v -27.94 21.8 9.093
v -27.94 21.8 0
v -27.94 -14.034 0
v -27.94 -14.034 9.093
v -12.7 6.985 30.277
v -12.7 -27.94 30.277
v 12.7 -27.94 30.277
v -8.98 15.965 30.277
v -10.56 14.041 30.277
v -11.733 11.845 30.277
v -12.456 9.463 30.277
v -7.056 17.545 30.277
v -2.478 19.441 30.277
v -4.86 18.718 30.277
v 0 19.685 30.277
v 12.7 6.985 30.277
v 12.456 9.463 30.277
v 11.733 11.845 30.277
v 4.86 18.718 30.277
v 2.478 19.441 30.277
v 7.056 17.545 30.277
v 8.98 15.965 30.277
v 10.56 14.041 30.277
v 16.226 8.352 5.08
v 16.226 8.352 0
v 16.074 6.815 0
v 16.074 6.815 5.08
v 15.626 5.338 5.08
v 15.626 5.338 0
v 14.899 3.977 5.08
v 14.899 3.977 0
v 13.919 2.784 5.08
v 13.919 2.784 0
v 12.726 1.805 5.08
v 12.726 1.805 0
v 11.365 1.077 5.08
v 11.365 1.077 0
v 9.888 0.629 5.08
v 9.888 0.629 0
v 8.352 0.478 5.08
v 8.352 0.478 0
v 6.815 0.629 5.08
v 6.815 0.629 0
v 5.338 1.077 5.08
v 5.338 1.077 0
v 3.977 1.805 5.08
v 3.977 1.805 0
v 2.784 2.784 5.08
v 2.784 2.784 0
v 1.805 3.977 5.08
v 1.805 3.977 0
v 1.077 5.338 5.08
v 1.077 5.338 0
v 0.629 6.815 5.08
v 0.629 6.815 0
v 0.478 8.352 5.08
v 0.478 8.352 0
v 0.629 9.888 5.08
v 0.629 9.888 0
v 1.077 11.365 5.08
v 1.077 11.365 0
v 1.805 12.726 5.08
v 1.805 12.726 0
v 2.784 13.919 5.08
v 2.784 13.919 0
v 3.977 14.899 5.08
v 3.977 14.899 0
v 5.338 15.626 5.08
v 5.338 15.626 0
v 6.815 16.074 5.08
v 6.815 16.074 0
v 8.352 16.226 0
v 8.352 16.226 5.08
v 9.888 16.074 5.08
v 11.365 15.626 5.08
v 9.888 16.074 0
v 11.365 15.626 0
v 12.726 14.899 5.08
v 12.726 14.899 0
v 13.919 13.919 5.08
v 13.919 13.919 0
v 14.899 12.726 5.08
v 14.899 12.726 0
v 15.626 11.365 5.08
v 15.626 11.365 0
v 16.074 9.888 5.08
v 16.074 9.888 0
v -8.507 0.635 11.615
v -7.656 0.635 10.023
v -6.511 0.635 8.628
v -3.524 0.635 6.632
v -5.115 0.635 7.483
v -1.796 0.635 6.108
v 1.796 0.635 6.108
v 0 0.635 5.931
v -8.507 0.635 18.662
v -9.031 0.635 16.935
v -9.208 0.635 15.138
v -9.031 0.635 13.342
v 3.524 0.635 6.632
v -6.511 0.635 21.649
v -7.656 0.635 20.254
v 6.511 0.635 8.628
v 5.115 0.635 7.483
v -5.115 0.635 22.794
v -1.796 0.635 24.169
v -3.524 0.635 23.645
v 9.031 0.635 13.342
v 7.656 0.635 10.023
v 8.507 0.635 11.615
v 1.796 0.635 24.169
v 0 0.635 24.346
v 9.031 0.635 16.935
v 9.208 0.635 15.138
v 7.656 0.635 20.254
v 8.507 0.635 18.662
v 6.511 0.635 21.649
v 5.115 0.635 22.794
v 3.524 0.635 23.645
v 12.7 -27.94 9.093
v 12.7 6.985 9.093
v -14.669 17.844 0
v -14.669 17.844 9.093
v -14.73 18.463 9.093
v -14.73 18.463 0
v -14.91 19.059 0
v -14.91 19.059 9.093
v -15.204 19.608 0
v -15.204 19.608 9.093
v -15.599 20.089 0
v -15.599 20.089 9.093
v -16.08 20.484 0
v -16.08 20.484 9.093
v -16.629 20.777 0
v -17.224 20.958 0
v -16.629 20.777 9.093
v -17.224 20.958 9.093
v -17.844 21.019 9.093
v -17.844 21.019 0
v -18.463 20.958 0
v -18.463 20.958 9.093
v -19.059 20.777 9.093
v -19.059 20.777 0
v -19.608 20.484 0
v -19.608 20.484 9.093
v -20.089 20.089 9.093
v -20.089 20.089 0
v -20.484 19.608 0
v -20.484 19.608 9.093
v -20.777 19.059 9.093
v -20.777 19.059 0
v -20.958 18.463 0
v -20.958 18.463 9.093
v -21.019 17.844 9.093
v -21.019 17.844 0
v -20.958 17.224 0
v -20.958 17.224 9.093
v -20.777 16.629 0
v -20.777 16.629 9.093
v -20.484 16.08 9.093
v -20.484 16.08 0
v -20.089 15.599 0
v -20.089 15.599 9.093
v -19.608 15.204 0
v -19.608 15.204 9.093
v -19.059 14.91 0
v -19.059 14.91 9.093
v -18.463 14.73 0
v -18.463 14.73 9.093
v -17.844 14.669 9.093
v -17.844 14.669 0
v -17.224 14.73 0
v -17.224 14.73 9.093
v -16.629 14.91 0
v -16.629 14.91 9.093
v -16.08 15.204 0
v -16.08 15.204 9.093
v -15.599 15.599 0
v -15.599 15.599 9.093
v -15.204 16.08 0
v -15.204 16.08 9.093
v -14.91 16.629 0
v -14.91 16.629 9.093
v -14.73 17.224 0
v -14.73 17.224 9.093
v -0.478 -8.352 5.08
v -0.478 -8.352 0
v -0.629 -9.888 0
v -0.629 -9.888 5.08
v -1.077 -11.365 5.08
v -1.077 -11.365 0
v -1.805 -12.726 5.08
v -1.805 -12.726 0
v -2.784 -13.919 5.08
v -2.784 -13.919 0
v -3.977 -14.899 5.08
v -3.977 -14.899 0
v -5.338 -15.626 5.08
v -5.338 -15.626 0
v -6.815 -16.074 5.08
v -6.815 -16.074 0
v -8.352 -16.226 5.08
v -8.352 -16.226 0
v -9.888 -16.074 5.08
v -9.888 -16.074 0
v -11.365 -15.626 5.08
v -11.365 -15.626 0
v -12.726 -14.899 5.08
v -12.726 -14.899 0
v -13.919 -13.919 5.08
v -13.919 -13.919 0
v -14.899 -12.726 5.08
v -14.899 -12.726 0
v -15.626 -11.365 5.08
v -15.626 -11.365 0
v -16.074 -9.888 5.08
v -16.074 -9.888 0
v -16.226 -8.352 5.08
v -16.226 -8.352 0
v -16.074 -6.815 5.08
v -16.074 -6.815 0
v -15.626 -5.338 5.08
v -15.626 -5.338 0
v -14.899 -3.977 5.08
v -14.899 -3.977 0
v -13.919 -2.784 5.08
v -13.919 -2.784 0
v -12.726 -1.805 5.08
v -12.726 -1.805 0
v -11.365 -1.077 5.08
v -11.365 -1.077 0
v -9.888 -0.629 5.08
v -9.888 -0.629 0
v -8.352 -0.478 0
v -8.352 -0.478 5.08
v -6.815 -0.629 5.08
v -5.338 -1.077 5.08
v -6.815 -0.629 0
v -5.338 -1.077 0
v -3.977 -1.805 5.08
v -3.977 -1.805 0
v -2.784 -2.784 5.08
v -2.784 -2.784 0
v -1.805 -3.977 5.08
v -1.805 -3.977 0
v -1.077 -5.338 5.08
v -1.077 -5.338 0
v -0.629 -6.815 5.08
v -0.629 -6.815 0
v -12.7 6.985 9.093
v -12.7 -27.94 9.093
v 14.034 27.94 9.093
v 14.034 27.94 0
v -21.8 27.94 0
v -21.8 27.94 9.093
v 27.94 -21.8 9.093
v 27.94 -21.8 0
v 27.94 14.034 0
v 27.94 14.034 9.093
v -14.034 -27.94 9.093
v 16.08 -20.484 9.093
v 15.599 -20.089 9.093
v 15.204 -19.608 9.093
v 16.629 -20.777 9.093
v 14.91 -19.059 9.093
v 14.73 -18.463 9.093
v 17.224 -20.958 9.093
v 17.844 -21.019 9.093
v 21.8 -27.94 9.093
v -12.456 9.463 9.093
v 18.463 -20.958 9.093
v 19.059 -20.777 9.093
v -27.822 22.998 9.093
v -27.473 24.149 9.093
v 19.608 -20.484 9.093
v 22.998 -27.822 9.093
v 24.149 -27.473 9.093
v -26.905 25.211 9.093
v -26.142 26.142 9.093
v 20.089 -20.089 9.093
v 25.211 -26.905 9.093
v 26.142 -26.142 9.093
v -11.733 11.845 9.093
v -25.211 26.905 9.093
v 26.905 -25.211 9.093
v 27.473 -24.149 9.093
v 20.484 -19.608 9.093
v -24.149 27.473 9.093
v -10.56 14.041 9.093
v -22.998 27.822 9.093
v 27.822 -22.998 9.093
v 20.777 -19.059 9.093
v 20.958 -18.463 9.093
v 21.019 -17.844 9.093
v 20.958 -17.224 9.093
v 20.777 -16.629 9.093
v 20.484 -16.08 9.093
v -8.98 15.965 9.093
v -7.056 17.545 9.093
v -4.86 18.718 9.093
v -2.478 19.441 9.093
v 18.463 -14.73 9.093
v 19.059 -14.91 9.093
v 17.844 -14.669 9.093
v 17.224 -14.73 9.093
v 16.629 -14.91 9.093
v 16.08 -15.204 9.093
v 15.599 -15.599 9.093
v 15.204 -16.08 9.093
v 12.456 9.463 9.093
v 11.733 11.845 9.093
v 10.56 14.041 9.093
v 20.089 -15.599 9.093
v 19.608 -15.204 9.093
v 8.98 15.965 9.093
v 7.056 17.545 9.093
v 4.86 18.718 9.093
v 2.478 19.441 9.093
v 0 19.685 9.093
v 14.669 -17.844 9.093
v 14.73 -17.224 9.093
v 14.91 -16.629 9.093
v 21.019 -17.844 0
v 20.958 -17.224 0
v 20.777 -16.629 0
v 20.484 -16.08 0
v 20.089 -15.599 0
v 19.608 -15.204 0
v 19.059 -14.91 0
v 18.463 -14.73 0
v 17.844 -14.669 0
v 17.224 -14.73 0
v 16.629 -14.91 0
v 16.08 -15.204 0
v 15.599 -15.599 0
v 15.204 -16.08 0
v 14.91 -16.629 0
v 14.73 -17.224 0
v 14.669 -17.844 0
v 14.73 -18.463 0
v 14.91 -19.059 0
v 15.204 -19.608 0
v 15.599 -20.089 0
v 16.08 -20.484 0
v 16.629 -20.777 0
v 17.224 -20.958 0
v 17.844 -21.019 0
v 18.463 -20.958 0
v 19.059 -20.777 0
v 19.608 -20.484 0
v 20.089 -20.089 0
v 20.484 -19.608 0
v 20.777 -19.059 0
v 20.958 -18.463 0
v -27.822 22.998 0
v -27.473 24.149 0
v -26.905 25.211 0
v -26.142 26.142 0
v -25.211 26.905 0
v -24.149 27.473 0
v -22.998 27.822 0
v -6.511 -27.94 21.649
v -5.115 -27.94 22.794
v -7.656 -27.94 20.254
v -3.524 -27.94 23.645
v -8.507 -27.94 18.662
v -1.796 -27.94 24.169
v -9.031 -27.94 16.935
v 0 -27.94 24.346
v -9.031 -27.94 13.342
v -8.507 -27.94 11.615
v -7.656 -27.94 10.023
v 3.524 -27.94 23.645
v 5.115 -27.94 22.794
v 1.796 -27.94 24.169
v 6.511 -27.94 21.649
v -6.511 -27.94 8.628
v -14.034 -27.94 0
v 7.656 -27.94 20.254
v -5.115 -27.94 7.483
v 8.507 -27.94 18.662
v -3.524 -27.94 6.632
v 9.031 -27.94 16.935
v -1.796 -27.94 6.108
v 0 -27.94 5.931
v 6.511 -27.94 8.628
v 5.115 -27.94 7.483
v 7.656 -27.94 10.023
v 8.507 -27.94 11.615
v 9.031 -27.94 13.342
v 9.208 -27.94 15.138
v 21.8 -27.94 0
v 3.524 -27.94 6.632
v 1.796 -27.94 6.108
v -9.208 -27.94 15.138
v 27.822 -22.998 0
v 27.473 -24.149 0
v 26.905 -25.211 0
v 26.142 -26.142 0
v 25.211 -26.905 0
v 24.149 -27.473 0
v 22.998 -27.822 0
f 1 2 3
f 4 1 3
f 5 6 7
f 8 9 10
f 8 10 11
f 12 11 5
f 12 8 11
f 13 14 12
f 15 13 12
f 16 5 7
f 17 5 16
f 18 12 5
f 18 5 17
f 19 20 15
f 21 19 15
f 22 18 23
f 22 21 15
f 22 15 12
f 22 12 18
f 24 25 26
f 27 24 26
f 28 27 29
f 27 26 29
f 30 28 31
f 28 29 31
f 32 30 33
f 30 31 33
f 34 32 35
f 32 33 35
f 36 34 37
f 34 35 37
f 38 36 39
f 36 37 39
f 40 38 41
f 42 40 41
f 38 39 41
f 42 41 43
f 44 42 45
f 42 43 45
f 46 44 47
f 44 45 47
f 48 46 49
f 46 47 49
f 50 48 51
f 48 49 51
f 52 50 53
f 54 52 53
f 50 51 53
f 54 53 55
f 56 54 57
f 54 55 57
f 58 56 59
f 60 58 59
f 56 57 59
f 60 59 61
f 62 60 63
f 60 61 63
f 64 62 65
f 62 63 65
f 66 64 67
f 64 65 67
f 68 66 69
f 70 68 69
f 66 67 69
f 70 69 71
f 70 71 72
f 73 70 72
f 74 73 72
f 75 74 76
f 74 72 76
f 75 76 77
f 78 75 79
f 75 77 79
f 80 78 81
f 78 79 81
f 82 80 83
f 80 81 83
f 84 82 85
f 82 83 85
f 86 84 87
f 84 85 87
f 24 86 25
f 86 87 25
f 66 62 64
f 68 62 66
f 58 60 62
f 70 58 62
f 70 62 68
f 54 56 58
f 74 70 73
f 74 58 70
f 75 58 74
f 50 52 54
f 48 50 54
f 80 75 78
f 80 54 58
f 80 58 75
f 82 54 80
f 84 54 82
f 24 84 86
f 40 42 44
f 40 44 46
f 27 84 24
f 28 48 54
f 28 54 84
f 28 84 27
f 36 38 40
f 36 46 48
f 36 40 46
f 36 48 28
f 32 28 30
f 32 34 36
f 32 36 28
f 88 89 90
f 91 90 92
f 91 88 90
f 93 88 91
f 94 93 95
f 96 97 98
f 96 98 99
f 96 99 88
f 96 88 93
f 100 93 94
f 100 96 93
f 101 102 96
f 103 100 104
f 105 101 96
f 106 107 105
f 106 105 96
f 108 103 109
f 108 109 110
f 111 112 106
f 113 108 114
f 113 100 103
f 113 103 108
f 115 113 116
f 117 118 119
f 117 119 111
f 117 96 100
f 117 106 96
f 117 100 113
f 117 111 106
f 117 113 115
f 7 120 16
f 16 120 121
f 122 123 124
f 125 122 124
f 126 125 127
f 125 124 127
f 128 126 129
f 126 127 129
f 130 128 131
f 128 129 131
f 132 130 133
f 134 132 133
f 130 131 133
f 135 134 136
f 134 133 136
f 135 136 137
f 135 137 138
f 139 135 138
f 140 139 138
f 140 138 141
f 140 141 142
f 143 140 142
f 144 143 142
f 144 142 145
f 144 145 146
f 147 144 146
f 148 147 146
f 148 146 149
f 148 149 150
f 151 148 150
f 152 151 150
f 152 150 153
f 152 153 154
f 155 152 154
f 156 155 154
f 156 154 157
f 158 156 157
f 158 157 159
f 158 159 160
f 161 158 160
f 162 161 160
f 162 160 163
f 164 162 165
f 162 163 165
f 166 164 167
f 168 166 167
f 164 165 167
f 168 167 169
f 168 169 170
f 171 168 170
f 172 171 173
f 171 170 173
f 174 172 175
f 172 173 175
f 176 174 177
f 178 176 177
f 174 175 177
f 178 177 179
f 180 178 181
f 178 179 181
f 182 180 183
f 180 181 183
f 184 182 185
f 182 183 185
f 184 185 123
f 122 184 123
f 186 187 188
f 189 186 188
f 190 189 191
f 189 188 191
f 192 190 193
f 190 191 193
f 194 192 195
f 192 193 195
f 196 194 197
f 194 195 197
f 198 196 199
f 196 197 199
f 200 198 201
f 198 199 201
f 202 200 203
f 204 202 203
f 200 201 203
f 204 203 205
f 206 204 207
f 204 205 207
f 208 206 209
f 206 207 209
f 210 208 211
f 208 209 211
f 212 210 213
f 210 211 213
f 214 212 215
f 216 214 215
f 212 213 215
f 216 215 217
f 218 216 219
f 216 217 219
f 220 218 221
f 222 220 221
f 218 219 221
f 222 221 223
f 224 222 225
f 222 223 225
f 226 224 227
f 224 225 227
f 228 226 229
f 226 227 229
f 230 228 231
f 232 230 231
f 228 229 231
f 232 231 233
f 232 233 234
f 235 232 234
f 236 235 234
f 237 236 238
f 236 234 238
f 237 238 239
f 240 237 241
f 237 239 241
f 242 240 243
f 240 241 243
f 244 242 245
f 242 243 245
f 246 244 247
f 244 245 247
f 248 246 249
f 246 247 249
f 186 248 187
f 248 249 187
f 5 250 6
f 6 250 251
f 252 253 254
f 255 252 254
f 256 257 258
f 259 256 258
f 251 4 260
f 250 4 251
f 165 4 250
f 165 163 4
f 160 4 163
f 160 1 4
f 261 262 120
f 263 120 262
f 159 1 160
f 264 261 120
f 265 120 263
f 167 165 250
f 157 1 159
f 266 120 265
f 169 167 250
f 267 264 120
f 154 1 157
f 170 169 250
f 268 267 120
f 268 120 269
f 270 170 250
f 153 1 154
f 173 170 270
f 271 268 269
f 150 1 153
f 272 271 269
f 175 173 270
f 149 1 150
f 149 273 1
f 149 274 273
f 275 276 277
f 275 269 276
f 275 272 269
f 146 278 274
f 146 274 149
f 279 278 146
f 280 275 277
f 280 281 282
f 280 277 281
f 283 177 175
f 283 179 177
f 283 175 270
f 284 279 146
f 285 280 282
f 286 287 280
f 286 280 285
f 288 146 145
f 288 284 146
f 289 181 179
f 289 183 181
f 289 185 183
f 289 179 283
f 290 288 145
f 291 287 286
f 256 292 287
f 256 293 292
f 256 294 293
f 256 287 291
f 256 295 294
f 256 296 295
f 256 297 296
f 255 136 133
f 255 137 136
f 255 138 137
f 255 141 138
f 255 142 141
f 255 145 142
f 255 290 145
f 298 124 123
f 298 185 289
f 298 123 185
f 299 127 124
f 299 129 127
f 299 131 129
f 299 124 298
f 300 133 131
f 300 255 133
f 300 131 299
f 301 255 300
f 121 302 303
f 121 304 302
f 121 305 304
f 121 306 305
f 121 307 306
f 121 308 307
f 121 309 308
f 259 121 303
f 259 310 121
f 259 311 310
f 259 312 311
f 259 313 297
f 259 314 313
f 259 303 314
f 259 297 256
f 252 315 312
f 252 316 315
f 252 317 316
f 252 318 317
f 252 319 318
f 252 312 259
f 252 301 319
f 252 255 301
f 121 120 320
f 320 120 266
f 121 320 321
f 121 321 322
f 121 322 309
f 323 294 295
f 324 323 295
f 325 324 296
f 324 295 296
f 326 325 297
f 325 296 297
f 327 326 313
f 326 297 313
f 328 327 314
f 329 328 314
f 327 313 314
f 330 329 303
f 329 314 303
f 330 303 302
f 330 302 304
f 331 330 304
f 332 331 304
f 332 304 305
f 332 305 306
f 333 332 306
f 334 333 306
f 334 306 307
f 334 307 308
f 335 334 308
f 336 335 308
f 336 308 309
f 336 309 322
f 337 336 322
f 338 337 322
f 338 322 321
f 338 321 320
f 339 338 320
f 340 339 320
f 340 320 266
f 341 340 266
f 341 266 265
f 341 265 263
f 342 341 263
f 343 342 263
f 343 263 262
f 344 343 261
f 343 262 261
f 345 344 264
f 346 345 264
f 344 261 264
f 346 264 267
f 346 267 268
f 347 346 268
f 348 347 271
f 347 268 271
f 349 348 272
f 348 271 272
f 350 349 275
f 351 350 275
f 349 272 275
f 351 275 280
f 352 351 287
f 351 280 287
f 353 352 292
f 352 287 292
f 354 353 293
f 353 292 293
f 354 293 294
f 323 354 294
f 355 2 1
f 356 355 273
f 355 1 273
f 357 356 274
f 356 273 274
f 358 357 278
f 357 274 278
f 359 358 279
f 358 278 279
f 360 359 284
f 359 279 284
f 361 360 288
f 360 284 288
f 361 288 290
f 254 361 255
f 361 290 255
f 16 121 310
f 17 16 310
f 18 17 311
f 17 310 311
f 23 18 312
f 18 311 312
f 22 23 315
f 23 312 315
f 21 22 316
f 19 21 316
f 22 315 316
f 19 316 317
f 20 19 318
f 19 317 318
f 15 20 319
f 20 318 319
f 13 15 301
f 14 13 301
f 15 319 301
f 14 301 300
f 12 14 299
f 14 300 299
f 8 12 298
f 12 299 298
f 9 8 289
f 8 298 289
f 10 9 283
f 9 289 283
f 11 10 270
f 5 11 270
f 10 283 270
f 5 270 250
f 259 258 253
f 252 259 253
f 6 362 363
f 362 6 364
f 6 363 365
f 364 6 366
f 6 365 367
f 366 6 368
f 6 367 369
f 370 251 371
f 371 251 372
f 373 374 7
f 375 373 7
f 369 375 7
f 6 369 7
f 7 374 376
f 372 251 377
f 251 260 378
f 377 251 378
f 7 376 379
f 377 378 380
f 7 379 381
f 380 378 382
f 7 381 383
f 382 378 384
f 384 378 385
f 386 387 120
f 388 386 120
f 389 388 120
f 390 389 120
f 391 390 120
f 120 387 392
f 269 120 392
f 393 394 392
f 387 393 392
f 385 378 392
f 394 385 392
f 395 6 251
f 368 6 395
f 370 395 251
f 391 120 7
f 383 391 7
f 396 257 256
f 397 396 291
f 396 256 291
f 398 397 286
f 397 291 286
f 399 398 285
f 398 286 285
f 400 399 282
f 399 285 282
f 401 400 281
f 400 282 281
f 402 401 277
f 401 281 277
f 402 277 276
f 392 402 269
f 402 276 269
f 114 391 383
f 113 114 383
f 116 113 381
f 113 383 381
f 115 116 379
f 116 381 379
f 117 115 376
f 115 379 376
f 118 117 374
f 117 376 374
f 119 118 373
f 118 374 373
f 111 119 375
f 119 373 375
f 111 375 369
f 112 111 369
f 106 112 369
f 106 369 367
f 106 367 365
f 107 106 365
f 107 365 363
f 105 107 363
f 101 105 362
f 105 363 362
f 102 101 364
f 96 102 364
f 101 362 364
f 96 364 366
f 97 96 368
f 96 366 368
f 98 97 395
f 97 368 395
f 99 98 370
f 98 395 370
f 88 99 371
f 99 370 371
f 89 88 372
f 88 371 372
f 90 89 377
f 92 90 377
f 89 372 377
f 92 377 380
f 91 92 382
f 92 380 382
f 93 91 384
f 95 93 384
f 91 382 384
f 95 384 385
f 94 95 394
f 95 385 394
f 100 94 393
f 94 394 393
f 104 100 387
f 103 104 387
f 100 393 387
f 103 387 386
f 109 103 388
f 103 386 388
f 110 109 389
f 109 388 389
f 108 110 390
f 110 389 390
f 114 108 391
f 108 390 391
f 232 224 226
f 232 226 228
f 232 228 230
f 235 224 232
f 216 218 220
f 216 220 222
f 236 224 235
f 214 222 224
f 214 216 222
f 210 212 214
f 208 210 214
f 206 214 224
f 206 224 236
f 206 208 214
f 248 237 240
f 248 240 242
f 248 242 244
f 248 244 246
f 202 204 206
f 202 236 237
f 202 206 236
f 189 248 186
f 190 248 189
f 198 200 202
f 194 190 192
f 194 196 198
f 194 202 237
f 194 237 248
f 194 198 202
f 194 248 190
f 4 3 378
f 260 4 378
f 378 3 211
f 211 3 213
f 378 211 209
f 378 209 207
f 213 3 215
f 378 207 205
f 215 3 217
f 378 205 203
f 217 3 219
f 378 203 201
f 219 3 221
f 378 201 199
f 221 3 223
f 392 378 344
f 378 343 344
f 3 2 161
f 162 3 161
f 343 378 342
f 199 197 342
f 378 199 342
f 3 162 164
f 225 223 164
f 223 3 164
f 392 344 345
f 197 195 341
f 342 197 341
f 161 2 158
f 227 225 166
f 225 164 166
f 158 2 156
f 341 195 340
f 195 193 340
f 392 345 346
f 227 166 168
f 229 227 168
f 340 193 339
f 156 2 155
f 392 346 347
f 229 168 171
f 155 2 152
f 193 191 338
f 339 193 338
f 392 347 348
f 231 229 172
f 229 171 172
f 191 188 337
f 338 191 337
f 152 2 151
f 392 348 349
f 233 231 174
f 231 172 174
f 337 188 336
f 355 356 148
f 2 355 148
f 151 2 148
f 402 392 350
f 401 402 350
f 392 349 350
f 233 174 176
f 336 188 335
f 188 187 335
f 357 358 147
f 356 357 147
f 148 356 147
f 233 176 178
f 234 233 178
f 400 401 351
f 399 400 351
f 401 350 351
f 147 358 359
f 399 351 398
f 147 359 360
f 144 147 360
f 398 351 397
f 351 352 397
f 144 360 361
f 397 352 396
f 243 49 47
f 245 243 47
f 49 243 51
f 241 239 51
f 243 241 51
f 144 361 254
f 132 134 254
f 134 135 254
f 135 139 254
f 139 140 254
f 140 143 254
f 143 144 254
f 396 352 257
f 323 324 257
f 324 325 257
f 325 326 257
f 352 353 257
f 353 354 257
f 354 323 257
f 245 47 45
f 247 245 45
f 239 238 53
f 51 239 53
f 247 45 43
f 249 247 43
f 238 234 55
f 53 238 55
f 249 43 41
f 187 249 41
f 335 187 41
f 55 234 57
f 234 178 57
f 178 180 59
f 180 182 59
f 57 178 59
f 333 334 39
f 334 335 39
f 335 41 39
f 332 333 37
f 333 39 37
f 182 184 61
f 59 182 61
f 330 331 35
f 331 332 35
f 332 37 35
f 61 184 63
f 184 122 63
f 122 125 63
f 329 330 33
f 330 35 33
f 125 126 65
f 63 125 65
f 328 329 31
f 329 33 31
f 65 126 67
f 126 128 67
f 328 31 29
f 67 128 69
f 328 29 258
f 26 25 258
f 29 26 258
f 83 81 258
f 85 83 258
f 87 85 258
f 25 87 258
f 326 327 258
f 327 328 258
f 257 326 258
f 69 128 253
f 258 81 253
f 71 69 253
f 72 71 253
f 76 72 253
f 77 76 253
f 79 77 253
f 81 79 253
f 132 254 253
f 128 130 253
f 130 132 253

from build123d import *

# Parameters (mm, degrees)
F1_DEPTH = 9.0932
F3_DEPTH = 21.1836
F4_R     = 3.175
F5_DEPTH = 9.0942
F6_R     = 9.2075
F7_DEPTH = 28.575
F8_R     = 7.874
F9_DEPTH = 5.08


with BuildPart() as f1:
    # F0 (on Top) → F1 (new body)
    with BuildSketch(Plane.XY):
        Polygon((-27.94, 27.94), (-27.94, -14.033717), (-14.033717, -27.94), (27.94, -27.94), (27.94, 14.033717), (14.033717, 27.94), align=None)
    extrude(amount=F1_DEPTH)

    # F2 (on face) → F3 (join)
    with BuildSketch(Plane.XY.offset(9.0932)):
        with BuildLine():
            ThreePointArc((12.7, 6.985), (0, 19.685), (-12.7, 6.985))
            Line((-12.7, 6.985), (-12.7, -27.94))
            Line((-12.7, -27.94), (12.7, -27.94))
            Line((12.7, -27.94), (12.7, 6.985))
        make_face()
    extrude(amount=F3_DEPTH)

    # F4 (on face) → F5 (cut, through all)
    with BuildSketch(Plane.XY.offset(9.0932)):
        with BuildLine():
            Line((-27.94, 27.94), (-27.94, 21.799624))
            ThreePointArc((-27.94, 21.799624), (-26.141526, 26.141526), (-21.799624, 27.94))
            Line((-21.799624, 27.94), (-27.94, 27.94))
        make_face()
        with BuildLine():
            ThreePointArc((27.94, -21.799624), (26.141526, -26.141526), (21.799624, -27.94))
            Line((21.799624, -27.94), (27.94, -27.94))
            Line((27.94, -27.94), (27.94, -21.799624))
        make_face()
        with Locations((-17.843769, 17.843769)):
            Circle(F4_R)
        with Locations((17.843769, -17.843769)):
            Circle(F4_R)
    extrude(amount=-F5_DEPTH, mode=Mode.SUBTRACT)

    # F6 (on face) → F7 (cut)
    with BuildSketch(Plane.XZ.offset(27.94)):
        with Locations((0, 15.1384)):
            Circle(F6_R)
    extrude(amount=-F7_DEPTH, mode=Mode.SUBTRACT)

    # F8 (on face) → F9 (cut)
    with BuildSketch(Plane(origin=(0, 0, 0), x_dir=(1, 0, 0), z_dir=(0, 0, -1))):
        with Locations((8.351638, -8.351638)):
            Circle(F8_R)
        with Locations((-8.351638, 8.351638)):
            Circle(F8_R)
    extrude(amount=-F9_DEPTH, mode=Mode.SUBTRACT)


solid = f1.part
